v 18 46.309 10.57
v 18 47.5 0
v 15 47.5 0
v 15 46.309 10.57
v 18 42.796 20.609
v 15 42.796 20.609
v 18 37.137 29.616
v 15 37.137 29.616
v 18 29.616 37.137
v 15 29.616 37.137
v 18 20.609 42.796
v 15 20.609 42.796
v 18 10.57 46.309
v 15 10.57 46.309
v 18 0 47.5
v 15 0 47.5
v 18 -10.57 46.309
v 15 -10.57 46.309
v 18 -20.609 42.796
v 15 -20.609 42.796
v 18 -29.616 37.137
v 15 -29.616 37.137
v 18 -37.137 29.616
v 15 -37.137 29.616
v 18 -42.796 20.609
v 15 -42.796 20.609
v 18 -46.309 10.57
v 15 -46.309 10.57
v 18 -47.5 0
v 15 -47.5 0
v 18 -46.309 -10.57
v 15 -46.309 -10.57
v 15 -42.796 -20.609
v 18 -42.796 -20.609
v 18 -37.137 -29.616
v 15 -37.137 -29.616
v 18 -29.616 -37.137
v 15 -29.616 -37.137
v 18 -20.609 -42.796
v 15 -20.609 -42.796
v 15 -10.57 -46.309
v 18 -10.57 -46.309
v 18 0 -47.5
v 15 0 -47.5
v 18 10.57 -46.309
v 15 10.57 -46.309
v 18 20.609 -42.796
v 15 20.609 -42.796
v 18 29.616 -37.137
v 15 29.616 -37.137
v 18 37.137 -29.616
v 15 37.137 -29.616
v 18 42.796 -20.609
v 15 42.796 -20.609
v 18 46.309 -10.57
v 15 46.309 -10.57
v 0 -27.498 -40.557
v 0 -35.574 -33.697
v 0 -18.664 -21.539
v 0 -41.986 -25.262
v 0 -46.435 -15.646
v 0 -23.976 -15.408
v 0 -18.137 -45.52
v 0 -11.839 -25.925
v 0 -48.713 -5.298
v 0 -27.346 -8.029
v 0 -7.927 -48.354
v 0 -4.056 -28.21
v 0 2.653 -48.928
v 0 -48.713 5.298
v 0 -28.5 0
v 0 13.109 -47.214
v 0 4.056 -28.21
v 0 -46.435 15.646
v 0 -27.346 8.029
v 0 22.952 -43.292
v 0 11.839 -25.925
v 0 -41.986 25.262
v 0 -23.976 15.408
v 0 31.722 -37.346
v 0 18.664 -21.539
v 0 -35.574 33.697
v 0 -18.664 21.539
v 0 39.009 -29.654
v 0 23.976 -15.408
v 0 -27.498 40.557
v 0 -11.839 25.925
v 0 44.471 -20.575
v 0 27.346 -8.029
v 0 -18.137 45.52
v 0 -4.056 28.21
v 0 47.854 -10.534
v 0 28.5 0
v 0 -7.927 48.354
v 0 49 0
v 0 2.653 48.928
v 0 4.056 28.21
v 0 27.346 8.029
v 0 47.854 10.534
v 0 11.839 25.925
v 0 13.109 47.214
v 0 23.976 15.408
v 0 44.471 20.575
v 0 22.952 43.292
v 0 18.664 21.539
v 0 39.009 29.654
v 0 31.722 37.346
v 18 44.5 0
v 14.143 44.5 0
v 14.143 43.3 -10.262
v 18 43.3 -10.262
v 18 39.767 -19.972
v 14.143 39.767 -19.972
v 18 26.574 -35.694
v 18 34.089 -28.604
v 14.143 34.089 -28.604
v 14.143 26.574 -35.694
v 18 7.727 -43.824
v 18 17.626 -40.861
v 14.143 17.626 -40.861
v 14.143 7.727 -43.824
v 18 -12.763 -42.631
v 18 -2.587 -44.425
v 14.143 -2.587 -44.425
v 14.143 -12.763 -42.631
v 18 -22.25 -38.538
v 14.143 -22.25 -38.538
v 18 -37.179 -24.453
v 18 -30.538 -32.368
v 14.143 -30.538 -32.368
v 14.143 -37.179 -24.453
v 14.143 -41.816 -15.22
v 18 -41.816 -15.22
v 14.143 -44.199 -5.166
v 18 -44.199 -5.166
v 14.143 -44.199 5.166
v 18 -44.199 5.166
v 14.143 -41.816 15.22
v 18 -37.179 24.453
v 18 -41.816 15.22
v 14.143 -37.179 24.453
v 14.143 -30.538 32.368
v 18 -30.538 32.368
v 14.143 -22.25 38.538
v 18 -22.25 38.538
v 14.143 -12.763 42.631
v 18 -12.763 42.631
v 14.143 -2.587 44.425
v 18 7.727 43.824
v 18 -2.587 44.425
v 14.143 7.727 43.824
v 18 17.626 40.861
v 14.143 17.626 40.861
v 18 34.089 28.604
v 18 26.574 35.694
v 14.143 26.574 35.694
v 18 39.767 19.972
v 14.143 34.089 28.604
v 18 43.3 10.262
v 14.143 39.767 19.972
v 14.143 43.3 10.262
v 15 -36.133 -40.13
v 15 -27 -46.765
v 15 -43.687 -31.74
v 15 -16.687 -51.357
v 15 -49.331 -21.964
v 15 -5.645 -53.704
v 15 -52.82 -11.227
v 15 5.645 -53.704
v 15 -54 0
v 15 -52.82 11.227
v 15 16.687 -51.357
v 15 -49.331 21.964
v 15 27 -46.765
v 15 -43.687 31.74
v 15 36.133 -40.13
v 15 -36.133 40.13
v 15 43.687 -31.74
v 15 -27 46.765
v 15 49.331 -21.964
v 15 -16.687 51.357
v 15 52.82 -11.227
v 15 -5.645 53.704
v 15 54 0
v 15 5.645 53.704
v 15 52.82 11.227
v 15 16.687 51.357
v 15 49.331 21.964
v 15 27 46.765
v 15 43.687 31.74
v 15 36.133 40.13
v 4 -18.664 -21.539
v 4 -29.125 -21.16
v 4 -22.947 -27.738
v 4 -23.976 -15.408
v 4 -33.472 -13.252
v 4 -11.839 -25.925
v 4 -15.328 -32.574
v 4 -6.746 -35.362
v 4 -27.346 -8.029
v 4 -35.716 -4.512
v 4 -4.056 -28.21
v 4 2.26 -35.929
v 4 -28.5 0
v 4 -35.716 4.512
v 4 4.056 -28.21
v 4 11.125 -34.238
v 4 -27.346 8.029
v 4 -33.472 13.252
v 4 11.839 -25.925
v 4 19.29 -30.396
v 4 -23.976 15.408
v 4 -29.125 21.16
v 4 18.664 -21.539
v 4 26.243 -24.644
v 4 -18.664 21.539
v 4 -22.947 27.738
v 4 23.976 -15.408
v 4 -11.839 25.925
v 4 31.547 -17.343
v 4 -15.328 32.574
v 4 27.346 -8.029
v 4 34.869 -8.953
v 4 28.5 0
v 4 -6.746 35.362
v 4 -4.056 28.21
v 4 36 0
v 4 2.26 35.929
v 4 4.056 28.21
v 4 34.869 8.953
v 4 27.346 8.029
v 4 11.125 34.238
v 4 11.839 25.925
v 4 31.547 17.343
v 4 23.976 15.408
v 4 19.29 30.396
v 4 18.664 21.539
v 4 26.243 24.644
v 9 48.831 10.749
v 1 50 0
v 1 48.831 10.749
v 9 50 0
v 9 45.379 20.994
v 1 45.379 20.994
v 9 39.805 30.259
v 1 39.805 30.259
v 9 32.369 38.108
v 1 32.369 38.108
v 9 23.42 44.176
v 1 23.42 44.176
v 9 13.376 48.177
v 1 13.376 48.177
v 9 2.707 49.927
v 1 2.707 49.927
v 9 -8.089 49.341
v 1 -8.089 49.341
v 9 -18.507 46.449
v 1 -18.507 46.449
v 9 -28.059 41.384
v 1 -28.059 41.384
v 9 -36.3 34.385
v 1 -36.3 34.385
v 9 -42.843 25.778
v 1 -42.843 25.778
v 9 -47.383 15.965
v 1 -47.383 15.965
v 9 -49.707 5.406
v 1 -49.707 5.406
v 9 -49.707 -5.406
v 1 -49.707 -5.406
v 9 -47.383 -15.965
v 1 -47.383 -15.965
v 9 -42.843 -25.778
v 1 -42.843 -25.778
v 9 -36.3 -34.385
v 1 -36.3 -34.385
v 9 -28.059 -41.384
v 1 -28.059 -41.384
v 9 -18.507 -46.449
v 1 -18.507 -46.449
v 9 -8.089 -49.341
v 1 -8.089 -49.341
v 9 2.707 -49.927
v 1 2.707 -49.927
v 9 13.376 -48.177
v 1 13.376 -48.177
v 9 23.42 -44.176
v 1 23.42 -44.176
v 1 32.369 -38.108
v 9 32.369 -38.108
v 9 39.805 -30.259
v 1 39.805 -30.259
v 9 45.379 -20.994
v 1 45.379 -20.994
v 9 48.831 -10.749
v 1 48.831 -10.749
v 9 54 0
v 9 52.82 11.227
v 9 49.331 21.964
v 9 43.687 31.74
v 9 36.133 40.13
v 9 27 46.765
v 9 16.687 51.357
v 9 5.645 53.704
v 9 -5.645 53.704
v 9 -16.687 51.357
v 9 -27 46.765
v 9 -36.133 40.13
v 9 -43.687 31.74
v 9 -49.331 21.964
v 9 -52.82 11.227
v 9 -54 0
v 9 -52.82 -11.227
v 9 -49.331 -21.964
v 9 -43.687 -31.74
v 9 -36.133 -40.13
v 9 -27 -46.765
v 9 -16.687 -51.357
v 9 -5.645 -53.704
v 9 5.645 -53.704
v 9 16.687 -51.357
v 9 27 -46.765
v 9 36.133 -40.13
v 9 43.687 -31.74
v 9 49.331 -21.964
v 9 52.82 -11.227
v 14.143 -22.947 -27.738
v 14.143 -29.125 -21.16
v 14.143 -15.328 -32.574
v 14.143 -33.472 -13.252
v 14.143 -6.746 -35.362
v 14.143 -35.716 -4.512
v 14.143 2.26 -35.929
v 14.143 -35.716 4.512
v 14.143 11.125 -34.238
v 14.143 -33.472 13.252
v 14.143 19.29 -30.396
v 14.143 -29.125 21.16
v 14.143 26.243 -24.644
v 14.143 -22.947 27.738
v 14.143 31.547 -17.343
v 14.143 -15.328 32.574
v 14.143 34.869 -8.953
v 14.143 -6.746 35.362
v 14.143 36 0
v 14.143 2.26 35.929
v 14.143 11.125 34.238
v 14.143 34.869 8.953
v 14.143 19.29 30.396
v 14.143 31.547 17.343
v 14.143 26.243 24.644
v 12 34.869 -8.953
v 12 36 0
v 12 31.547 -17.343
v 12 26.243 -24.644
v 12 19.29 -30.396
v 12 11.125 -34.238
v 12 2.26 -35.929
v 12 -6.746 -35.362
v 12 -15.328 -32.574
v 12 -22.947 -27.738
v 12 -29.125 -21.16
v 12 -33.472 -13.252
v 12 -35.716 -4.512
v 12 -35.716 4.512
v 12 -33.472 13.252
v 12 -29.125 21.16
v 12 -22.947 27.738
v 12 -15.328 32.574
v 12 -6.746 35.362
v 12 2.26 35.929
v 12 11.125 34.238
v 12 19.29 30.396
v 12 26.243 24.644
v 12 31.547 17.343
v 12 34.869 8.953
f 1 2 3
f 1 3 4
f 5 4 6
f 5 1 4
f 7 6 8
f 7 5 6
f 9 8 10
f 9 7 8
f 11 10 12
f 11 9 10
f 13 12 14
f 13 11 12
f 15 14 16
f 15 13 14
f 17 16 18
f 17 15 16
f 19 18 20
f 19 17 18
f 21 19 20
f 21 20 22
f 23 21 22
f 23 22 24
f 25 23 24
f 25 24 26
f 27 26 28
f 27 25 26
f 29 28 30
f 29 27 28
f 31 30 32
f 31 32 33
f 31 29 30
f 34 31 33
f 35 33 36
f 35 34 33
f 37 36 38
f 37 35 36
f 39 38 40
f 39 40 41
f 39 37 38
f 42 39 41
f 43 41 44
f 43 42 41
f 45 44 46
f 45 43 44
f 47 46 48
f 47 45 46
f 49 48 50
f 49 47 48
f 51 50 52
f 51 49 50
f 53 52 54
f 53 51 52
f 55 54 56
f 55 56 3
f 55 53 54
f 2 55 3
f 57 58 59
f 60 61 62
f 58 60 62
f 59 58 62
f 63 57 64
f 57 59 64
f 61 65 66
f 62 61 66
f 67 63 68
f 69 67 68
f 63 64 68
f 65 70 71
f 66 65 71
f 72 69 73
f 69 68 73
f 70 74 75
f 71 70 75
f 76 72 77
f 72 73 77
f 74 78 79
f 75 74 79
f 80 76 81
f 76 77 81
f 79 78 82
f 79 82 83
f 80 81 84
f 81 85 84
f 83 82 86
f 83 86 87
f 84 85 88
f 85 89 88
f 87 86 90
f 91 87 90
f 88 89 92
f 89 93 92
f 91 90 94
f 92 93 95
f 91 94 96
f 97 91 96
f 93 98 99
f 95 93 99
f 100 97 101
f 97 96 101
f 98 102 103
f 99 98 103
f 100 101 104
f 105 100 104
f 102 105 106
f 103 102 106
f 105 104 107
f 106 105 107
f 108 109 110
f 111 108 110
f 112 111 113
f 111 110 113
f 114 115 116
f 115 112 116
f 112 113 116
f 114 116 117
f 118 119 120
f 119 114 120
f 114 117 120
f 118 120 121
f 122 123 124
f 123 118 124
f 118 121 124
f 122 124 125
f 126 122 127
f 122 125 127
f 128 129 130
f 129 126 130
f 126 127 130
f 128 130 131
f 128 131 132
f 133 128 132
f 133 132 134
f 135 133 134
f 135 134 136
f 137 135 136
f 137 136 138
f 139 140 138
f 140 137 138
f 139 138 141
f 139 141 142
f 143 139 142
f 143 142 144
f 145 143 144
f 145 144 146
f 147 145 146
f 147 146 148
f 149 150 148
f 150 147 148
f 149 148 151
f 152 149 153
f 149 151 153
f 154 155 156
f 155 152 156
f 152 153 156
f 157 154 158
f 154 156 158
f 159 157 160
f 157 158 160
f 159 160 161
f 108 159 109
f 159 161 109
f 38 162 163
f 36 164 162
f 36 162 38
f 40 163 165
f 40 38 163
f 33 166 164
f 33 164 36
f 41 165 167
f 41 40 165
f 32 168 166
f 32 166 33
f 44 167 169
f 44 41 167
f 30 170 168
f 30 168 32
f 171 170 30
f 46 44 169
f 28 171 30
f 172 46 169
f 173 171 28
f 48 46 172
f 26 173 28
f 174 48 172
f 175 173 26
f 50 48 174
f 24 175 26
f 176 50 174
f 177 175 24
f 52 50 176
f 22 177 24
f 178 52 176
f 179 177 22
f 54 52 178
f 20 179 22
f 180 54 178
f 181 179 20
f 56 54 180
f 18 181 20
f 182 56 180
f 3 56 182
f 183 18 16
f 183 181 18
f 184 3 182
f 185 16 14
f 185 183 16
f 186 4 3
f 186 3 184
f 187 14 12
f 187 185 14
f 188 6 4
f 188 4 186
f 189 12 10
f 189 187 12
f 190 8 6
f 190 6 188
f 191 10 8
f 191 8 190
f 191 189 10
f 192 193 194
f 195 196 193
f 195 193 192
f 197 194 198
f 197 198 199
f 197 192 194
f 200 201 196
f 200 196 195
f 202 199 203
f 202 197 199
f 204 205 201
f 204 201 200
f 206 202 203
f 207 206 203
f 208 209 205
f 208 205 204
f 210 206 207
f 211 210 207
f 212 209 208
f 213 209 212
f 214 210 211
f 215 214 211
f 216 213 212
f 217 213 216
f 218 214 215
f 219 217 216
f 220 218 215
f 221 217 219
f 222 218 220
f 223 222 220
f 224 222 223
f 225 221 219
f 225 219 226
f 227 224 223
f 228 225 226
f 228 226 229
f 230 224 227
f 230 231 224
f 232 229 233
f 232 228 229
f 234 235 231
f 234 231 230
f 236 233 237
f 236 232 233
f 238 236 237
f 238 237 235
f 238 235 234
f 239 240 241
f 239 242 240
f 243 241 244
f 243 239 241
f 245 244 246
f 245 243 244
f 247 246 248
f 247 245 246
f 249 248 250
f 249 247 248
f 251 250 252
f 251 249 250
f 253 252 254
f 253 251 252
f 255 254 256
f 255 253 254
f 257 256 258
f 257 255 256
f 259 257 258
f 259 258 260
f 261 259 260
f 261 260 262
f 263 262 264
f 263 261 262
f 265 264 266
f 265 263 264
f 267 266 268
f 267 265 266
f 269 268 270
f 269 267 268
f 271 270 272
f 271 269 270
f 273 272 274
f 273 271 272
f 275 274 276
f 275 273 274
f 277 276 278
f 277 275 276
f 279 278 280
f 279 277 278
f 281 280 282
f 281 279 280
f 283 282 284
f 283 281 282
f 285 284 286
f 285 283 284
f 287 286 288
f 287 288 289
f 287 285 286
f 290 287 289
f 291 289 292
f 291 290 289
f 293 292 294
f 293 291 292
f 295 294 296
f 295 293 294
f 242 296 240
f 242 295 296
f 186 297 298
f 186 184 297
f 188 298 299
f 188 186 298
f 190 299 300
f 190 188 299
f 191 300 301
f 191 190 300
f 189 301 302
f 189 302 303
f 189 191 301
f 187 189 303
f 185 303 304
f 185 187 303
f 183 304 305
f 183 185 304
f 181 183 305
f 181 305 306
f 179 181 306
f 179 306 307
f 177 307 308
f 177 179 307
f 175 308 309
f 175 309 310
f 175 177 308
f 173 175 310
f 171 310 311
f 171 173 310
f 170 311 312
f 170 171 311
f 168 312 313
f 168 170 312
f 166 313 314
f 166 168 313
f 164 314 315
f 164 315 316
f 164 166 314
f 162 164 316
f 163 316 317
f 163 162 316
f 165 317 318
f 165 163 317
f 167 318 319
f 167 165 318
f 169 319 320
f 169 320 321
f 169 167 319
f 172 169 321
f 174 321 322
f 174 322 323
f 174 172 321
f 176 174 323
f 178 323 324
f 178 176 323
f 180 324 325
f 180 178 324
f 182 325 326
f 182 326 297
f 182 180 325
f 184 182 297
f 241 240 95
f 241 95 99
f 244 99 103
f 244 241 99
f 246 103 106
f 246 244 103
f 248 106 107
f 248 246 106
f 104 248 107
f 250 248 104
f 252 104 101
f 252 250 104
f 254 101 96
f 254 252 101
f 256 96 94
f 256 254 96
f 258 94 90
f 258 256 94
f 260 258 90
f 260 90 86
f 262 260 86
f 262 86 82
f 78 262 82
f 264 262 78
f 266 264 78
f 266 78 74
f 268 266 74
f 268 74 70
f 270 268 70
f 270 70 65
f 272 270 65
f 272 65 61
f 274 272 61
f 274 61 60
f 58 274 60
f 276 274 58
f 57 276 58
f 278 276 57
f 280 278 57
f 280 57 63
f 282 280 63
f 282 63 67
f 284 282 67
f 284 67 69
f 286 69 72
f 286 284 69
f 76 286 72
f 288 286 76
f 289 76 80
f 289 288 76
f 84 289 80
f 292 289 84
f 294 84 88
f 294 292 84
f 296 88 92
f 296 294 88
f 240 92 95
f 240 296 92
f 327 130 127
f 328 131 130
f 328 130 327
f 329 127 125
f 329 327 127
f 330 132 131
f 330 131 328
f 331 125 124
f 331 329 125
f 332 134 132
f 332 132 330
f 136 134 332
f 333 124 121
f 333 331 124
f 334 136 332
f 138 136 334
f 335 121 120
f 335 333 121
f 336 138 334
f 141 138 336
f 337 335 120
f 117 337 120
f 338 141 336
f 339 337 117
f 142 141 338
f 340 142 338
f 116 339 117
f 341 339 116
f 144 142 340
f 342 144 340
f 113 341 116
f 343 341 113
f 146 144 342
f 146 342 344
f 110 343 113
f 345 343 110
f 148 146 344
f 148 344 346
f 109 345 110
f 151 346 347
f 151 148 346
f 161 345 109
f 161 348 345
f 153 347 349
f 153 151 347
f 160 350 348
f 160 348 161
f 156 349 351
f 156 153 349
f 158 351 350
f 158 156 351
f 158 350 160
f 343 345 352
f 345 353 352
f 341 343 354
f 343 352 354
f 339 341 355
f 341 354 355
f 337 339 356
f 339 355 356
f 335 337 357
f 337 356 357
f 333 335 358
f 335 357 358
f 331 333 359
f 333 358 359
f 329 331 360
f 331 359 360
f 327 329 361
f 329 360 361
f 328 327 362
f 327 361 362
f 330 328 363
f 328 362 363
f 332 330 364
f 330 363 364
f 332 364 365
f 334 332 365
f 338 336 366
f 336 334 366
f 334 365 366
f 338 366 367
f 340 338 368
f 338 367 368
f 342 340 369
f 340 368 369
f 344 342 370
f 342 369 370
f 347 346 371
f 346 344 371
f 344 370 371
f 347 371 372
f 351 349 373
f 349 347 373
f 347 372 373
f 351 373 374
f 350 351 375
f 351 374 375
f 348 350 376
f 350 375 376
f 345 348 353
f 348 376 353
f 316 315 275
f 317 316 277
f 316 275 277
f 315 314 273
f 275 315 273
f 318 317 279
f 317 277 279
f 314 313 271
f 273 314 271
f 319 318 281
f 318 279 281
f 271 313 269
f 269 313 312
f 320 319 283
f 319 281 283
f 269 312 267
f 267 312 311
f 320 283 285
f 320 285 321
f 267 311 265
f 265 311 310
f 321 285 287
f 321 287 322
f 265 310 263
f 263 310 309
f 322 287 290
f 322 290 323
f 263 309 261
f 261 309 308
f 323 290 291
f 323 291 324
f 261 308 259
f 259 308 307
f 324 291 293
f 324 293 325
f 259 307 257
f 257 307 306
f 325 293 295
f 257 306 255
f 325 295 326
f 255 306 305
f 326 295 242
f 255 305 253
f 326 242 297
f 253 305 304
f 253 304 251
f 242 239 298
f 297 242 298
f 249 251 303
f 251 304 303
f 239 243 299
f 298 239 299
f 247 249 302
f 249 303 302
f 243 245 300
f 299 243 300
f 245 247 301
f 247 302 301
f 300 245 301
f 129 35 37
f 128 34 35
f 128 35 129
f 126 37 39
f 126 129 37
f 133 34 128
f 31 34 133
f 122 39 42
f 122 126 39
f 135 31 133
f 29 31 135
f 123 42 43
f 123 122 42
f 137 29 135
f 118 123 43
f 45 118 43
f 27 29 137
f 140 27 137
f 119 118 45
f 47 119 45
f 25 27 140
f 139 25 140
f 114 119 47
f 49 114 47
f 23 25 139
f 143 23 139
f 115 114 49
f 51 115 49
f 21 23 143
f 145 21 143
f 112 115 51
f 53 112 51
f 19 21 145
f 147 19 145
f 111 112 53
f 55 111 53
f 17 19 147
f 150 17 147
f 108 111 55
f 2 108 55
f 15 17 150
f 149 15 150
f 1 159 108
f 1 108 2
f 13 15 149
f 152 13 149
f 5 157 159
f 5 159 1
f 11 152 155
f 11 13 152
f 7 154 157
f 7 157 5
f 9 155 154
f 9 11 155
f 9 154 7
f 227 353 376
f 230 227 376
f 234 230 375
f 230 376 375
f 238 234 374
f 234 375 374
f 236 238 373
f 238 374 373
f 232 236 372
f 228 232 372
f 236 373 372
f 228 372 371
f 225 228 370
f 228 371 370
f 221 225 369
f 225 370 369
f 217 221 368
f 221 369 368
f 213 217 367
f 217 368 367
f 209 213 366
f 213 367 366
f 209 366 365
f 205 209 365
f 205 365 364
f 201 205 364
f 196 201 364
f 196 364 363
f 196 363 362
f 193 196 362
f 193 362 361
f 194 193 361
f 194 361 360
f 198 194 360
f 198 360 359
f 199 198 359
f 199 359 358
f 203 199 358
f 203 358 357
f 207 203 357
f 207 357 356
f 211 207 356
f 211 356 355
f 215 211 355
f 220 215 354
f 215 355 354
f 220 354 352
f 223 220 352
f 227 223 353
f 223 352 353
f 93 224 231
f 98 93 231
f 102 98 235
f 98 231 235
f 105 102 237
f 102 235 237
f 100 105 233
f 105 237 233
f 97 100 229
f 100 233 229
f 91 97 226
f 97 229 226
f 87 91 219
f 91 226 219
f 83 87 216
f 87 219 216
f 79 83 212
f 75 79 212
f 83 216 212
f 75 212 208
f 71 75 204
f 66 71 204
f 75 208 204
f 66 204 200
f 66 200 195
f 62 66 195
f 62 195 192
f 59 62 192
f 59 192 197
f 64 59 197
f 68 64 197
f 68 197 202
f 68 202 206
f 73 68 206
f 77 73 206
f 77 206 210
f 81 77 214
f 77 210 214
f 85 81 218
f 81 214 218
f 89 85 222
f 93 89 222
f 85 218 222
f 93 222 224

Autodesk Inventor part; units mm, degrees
ref_plane "YZ Plane" through (0, 0, 0) normal (1, 0, 0) x (0, 1, 0)
ref_plane "XZ Plane" through (0, 0, 0) normal (0, 1, 0) x (-1, 0, 0)
ref_plane "XY Plane" through (0, 0, 0) normal (0, 0, 1) x (1, 0, 0)
sketch "Эскиз1" plane through (0, 0, 0) normal (0, 0, 1) x (1, 0, 0)
  line L0 (0, 0) -> (118.4333, 0)
  line L1 (0, 28.5) -> (4, 28.5)
  line L2 (4, 28.5) -> (4, 36)
  line L3 (0, 28.5) -> (0, 50)
  line L4 (0, 50) -> (9, 50)
  line L5 (9, 50) -> (9, 54)
  line L6 (9, 54) -> (15, 54)
  line L7 (15, 54) -> (15, 47.5)
  line L8 (4, 36) -> (12, 36)
  line L9 (15, 47.5) -> (18, 47.5)
  line L10 (18, 47.5) -> (18, 44.5)
  line L11 (18, 44.5) -> (14.1429, 44.5)
  line L12 (14.1429, 44.5) -> (14.1429, 36)
  line L13 (14.1429, 36) -> (12, 36)
  dimension "d0" = 57
  dimension "d1" = 100
  dimension "d3" = 6
  dimension "d4" = 4
  dimension "d6" = 72
  dimension "d7" = 8
  dimension "d8" = 4
  dimension "d10" = 3
  dimension "d11" = 95
  dimension "d13" = 9
  dimension "d17" = 3
revolve "Вращение1" add sketch "Эскиз1" angle 360 about axis through (0, 0, 0) along (1, 0, 0)
chamfer "Фаска1" distance 1 angle 45 1 edges at (0, -50, 0)
properties part number "Крышка_Левая" material "Сталь, углеродистая"
